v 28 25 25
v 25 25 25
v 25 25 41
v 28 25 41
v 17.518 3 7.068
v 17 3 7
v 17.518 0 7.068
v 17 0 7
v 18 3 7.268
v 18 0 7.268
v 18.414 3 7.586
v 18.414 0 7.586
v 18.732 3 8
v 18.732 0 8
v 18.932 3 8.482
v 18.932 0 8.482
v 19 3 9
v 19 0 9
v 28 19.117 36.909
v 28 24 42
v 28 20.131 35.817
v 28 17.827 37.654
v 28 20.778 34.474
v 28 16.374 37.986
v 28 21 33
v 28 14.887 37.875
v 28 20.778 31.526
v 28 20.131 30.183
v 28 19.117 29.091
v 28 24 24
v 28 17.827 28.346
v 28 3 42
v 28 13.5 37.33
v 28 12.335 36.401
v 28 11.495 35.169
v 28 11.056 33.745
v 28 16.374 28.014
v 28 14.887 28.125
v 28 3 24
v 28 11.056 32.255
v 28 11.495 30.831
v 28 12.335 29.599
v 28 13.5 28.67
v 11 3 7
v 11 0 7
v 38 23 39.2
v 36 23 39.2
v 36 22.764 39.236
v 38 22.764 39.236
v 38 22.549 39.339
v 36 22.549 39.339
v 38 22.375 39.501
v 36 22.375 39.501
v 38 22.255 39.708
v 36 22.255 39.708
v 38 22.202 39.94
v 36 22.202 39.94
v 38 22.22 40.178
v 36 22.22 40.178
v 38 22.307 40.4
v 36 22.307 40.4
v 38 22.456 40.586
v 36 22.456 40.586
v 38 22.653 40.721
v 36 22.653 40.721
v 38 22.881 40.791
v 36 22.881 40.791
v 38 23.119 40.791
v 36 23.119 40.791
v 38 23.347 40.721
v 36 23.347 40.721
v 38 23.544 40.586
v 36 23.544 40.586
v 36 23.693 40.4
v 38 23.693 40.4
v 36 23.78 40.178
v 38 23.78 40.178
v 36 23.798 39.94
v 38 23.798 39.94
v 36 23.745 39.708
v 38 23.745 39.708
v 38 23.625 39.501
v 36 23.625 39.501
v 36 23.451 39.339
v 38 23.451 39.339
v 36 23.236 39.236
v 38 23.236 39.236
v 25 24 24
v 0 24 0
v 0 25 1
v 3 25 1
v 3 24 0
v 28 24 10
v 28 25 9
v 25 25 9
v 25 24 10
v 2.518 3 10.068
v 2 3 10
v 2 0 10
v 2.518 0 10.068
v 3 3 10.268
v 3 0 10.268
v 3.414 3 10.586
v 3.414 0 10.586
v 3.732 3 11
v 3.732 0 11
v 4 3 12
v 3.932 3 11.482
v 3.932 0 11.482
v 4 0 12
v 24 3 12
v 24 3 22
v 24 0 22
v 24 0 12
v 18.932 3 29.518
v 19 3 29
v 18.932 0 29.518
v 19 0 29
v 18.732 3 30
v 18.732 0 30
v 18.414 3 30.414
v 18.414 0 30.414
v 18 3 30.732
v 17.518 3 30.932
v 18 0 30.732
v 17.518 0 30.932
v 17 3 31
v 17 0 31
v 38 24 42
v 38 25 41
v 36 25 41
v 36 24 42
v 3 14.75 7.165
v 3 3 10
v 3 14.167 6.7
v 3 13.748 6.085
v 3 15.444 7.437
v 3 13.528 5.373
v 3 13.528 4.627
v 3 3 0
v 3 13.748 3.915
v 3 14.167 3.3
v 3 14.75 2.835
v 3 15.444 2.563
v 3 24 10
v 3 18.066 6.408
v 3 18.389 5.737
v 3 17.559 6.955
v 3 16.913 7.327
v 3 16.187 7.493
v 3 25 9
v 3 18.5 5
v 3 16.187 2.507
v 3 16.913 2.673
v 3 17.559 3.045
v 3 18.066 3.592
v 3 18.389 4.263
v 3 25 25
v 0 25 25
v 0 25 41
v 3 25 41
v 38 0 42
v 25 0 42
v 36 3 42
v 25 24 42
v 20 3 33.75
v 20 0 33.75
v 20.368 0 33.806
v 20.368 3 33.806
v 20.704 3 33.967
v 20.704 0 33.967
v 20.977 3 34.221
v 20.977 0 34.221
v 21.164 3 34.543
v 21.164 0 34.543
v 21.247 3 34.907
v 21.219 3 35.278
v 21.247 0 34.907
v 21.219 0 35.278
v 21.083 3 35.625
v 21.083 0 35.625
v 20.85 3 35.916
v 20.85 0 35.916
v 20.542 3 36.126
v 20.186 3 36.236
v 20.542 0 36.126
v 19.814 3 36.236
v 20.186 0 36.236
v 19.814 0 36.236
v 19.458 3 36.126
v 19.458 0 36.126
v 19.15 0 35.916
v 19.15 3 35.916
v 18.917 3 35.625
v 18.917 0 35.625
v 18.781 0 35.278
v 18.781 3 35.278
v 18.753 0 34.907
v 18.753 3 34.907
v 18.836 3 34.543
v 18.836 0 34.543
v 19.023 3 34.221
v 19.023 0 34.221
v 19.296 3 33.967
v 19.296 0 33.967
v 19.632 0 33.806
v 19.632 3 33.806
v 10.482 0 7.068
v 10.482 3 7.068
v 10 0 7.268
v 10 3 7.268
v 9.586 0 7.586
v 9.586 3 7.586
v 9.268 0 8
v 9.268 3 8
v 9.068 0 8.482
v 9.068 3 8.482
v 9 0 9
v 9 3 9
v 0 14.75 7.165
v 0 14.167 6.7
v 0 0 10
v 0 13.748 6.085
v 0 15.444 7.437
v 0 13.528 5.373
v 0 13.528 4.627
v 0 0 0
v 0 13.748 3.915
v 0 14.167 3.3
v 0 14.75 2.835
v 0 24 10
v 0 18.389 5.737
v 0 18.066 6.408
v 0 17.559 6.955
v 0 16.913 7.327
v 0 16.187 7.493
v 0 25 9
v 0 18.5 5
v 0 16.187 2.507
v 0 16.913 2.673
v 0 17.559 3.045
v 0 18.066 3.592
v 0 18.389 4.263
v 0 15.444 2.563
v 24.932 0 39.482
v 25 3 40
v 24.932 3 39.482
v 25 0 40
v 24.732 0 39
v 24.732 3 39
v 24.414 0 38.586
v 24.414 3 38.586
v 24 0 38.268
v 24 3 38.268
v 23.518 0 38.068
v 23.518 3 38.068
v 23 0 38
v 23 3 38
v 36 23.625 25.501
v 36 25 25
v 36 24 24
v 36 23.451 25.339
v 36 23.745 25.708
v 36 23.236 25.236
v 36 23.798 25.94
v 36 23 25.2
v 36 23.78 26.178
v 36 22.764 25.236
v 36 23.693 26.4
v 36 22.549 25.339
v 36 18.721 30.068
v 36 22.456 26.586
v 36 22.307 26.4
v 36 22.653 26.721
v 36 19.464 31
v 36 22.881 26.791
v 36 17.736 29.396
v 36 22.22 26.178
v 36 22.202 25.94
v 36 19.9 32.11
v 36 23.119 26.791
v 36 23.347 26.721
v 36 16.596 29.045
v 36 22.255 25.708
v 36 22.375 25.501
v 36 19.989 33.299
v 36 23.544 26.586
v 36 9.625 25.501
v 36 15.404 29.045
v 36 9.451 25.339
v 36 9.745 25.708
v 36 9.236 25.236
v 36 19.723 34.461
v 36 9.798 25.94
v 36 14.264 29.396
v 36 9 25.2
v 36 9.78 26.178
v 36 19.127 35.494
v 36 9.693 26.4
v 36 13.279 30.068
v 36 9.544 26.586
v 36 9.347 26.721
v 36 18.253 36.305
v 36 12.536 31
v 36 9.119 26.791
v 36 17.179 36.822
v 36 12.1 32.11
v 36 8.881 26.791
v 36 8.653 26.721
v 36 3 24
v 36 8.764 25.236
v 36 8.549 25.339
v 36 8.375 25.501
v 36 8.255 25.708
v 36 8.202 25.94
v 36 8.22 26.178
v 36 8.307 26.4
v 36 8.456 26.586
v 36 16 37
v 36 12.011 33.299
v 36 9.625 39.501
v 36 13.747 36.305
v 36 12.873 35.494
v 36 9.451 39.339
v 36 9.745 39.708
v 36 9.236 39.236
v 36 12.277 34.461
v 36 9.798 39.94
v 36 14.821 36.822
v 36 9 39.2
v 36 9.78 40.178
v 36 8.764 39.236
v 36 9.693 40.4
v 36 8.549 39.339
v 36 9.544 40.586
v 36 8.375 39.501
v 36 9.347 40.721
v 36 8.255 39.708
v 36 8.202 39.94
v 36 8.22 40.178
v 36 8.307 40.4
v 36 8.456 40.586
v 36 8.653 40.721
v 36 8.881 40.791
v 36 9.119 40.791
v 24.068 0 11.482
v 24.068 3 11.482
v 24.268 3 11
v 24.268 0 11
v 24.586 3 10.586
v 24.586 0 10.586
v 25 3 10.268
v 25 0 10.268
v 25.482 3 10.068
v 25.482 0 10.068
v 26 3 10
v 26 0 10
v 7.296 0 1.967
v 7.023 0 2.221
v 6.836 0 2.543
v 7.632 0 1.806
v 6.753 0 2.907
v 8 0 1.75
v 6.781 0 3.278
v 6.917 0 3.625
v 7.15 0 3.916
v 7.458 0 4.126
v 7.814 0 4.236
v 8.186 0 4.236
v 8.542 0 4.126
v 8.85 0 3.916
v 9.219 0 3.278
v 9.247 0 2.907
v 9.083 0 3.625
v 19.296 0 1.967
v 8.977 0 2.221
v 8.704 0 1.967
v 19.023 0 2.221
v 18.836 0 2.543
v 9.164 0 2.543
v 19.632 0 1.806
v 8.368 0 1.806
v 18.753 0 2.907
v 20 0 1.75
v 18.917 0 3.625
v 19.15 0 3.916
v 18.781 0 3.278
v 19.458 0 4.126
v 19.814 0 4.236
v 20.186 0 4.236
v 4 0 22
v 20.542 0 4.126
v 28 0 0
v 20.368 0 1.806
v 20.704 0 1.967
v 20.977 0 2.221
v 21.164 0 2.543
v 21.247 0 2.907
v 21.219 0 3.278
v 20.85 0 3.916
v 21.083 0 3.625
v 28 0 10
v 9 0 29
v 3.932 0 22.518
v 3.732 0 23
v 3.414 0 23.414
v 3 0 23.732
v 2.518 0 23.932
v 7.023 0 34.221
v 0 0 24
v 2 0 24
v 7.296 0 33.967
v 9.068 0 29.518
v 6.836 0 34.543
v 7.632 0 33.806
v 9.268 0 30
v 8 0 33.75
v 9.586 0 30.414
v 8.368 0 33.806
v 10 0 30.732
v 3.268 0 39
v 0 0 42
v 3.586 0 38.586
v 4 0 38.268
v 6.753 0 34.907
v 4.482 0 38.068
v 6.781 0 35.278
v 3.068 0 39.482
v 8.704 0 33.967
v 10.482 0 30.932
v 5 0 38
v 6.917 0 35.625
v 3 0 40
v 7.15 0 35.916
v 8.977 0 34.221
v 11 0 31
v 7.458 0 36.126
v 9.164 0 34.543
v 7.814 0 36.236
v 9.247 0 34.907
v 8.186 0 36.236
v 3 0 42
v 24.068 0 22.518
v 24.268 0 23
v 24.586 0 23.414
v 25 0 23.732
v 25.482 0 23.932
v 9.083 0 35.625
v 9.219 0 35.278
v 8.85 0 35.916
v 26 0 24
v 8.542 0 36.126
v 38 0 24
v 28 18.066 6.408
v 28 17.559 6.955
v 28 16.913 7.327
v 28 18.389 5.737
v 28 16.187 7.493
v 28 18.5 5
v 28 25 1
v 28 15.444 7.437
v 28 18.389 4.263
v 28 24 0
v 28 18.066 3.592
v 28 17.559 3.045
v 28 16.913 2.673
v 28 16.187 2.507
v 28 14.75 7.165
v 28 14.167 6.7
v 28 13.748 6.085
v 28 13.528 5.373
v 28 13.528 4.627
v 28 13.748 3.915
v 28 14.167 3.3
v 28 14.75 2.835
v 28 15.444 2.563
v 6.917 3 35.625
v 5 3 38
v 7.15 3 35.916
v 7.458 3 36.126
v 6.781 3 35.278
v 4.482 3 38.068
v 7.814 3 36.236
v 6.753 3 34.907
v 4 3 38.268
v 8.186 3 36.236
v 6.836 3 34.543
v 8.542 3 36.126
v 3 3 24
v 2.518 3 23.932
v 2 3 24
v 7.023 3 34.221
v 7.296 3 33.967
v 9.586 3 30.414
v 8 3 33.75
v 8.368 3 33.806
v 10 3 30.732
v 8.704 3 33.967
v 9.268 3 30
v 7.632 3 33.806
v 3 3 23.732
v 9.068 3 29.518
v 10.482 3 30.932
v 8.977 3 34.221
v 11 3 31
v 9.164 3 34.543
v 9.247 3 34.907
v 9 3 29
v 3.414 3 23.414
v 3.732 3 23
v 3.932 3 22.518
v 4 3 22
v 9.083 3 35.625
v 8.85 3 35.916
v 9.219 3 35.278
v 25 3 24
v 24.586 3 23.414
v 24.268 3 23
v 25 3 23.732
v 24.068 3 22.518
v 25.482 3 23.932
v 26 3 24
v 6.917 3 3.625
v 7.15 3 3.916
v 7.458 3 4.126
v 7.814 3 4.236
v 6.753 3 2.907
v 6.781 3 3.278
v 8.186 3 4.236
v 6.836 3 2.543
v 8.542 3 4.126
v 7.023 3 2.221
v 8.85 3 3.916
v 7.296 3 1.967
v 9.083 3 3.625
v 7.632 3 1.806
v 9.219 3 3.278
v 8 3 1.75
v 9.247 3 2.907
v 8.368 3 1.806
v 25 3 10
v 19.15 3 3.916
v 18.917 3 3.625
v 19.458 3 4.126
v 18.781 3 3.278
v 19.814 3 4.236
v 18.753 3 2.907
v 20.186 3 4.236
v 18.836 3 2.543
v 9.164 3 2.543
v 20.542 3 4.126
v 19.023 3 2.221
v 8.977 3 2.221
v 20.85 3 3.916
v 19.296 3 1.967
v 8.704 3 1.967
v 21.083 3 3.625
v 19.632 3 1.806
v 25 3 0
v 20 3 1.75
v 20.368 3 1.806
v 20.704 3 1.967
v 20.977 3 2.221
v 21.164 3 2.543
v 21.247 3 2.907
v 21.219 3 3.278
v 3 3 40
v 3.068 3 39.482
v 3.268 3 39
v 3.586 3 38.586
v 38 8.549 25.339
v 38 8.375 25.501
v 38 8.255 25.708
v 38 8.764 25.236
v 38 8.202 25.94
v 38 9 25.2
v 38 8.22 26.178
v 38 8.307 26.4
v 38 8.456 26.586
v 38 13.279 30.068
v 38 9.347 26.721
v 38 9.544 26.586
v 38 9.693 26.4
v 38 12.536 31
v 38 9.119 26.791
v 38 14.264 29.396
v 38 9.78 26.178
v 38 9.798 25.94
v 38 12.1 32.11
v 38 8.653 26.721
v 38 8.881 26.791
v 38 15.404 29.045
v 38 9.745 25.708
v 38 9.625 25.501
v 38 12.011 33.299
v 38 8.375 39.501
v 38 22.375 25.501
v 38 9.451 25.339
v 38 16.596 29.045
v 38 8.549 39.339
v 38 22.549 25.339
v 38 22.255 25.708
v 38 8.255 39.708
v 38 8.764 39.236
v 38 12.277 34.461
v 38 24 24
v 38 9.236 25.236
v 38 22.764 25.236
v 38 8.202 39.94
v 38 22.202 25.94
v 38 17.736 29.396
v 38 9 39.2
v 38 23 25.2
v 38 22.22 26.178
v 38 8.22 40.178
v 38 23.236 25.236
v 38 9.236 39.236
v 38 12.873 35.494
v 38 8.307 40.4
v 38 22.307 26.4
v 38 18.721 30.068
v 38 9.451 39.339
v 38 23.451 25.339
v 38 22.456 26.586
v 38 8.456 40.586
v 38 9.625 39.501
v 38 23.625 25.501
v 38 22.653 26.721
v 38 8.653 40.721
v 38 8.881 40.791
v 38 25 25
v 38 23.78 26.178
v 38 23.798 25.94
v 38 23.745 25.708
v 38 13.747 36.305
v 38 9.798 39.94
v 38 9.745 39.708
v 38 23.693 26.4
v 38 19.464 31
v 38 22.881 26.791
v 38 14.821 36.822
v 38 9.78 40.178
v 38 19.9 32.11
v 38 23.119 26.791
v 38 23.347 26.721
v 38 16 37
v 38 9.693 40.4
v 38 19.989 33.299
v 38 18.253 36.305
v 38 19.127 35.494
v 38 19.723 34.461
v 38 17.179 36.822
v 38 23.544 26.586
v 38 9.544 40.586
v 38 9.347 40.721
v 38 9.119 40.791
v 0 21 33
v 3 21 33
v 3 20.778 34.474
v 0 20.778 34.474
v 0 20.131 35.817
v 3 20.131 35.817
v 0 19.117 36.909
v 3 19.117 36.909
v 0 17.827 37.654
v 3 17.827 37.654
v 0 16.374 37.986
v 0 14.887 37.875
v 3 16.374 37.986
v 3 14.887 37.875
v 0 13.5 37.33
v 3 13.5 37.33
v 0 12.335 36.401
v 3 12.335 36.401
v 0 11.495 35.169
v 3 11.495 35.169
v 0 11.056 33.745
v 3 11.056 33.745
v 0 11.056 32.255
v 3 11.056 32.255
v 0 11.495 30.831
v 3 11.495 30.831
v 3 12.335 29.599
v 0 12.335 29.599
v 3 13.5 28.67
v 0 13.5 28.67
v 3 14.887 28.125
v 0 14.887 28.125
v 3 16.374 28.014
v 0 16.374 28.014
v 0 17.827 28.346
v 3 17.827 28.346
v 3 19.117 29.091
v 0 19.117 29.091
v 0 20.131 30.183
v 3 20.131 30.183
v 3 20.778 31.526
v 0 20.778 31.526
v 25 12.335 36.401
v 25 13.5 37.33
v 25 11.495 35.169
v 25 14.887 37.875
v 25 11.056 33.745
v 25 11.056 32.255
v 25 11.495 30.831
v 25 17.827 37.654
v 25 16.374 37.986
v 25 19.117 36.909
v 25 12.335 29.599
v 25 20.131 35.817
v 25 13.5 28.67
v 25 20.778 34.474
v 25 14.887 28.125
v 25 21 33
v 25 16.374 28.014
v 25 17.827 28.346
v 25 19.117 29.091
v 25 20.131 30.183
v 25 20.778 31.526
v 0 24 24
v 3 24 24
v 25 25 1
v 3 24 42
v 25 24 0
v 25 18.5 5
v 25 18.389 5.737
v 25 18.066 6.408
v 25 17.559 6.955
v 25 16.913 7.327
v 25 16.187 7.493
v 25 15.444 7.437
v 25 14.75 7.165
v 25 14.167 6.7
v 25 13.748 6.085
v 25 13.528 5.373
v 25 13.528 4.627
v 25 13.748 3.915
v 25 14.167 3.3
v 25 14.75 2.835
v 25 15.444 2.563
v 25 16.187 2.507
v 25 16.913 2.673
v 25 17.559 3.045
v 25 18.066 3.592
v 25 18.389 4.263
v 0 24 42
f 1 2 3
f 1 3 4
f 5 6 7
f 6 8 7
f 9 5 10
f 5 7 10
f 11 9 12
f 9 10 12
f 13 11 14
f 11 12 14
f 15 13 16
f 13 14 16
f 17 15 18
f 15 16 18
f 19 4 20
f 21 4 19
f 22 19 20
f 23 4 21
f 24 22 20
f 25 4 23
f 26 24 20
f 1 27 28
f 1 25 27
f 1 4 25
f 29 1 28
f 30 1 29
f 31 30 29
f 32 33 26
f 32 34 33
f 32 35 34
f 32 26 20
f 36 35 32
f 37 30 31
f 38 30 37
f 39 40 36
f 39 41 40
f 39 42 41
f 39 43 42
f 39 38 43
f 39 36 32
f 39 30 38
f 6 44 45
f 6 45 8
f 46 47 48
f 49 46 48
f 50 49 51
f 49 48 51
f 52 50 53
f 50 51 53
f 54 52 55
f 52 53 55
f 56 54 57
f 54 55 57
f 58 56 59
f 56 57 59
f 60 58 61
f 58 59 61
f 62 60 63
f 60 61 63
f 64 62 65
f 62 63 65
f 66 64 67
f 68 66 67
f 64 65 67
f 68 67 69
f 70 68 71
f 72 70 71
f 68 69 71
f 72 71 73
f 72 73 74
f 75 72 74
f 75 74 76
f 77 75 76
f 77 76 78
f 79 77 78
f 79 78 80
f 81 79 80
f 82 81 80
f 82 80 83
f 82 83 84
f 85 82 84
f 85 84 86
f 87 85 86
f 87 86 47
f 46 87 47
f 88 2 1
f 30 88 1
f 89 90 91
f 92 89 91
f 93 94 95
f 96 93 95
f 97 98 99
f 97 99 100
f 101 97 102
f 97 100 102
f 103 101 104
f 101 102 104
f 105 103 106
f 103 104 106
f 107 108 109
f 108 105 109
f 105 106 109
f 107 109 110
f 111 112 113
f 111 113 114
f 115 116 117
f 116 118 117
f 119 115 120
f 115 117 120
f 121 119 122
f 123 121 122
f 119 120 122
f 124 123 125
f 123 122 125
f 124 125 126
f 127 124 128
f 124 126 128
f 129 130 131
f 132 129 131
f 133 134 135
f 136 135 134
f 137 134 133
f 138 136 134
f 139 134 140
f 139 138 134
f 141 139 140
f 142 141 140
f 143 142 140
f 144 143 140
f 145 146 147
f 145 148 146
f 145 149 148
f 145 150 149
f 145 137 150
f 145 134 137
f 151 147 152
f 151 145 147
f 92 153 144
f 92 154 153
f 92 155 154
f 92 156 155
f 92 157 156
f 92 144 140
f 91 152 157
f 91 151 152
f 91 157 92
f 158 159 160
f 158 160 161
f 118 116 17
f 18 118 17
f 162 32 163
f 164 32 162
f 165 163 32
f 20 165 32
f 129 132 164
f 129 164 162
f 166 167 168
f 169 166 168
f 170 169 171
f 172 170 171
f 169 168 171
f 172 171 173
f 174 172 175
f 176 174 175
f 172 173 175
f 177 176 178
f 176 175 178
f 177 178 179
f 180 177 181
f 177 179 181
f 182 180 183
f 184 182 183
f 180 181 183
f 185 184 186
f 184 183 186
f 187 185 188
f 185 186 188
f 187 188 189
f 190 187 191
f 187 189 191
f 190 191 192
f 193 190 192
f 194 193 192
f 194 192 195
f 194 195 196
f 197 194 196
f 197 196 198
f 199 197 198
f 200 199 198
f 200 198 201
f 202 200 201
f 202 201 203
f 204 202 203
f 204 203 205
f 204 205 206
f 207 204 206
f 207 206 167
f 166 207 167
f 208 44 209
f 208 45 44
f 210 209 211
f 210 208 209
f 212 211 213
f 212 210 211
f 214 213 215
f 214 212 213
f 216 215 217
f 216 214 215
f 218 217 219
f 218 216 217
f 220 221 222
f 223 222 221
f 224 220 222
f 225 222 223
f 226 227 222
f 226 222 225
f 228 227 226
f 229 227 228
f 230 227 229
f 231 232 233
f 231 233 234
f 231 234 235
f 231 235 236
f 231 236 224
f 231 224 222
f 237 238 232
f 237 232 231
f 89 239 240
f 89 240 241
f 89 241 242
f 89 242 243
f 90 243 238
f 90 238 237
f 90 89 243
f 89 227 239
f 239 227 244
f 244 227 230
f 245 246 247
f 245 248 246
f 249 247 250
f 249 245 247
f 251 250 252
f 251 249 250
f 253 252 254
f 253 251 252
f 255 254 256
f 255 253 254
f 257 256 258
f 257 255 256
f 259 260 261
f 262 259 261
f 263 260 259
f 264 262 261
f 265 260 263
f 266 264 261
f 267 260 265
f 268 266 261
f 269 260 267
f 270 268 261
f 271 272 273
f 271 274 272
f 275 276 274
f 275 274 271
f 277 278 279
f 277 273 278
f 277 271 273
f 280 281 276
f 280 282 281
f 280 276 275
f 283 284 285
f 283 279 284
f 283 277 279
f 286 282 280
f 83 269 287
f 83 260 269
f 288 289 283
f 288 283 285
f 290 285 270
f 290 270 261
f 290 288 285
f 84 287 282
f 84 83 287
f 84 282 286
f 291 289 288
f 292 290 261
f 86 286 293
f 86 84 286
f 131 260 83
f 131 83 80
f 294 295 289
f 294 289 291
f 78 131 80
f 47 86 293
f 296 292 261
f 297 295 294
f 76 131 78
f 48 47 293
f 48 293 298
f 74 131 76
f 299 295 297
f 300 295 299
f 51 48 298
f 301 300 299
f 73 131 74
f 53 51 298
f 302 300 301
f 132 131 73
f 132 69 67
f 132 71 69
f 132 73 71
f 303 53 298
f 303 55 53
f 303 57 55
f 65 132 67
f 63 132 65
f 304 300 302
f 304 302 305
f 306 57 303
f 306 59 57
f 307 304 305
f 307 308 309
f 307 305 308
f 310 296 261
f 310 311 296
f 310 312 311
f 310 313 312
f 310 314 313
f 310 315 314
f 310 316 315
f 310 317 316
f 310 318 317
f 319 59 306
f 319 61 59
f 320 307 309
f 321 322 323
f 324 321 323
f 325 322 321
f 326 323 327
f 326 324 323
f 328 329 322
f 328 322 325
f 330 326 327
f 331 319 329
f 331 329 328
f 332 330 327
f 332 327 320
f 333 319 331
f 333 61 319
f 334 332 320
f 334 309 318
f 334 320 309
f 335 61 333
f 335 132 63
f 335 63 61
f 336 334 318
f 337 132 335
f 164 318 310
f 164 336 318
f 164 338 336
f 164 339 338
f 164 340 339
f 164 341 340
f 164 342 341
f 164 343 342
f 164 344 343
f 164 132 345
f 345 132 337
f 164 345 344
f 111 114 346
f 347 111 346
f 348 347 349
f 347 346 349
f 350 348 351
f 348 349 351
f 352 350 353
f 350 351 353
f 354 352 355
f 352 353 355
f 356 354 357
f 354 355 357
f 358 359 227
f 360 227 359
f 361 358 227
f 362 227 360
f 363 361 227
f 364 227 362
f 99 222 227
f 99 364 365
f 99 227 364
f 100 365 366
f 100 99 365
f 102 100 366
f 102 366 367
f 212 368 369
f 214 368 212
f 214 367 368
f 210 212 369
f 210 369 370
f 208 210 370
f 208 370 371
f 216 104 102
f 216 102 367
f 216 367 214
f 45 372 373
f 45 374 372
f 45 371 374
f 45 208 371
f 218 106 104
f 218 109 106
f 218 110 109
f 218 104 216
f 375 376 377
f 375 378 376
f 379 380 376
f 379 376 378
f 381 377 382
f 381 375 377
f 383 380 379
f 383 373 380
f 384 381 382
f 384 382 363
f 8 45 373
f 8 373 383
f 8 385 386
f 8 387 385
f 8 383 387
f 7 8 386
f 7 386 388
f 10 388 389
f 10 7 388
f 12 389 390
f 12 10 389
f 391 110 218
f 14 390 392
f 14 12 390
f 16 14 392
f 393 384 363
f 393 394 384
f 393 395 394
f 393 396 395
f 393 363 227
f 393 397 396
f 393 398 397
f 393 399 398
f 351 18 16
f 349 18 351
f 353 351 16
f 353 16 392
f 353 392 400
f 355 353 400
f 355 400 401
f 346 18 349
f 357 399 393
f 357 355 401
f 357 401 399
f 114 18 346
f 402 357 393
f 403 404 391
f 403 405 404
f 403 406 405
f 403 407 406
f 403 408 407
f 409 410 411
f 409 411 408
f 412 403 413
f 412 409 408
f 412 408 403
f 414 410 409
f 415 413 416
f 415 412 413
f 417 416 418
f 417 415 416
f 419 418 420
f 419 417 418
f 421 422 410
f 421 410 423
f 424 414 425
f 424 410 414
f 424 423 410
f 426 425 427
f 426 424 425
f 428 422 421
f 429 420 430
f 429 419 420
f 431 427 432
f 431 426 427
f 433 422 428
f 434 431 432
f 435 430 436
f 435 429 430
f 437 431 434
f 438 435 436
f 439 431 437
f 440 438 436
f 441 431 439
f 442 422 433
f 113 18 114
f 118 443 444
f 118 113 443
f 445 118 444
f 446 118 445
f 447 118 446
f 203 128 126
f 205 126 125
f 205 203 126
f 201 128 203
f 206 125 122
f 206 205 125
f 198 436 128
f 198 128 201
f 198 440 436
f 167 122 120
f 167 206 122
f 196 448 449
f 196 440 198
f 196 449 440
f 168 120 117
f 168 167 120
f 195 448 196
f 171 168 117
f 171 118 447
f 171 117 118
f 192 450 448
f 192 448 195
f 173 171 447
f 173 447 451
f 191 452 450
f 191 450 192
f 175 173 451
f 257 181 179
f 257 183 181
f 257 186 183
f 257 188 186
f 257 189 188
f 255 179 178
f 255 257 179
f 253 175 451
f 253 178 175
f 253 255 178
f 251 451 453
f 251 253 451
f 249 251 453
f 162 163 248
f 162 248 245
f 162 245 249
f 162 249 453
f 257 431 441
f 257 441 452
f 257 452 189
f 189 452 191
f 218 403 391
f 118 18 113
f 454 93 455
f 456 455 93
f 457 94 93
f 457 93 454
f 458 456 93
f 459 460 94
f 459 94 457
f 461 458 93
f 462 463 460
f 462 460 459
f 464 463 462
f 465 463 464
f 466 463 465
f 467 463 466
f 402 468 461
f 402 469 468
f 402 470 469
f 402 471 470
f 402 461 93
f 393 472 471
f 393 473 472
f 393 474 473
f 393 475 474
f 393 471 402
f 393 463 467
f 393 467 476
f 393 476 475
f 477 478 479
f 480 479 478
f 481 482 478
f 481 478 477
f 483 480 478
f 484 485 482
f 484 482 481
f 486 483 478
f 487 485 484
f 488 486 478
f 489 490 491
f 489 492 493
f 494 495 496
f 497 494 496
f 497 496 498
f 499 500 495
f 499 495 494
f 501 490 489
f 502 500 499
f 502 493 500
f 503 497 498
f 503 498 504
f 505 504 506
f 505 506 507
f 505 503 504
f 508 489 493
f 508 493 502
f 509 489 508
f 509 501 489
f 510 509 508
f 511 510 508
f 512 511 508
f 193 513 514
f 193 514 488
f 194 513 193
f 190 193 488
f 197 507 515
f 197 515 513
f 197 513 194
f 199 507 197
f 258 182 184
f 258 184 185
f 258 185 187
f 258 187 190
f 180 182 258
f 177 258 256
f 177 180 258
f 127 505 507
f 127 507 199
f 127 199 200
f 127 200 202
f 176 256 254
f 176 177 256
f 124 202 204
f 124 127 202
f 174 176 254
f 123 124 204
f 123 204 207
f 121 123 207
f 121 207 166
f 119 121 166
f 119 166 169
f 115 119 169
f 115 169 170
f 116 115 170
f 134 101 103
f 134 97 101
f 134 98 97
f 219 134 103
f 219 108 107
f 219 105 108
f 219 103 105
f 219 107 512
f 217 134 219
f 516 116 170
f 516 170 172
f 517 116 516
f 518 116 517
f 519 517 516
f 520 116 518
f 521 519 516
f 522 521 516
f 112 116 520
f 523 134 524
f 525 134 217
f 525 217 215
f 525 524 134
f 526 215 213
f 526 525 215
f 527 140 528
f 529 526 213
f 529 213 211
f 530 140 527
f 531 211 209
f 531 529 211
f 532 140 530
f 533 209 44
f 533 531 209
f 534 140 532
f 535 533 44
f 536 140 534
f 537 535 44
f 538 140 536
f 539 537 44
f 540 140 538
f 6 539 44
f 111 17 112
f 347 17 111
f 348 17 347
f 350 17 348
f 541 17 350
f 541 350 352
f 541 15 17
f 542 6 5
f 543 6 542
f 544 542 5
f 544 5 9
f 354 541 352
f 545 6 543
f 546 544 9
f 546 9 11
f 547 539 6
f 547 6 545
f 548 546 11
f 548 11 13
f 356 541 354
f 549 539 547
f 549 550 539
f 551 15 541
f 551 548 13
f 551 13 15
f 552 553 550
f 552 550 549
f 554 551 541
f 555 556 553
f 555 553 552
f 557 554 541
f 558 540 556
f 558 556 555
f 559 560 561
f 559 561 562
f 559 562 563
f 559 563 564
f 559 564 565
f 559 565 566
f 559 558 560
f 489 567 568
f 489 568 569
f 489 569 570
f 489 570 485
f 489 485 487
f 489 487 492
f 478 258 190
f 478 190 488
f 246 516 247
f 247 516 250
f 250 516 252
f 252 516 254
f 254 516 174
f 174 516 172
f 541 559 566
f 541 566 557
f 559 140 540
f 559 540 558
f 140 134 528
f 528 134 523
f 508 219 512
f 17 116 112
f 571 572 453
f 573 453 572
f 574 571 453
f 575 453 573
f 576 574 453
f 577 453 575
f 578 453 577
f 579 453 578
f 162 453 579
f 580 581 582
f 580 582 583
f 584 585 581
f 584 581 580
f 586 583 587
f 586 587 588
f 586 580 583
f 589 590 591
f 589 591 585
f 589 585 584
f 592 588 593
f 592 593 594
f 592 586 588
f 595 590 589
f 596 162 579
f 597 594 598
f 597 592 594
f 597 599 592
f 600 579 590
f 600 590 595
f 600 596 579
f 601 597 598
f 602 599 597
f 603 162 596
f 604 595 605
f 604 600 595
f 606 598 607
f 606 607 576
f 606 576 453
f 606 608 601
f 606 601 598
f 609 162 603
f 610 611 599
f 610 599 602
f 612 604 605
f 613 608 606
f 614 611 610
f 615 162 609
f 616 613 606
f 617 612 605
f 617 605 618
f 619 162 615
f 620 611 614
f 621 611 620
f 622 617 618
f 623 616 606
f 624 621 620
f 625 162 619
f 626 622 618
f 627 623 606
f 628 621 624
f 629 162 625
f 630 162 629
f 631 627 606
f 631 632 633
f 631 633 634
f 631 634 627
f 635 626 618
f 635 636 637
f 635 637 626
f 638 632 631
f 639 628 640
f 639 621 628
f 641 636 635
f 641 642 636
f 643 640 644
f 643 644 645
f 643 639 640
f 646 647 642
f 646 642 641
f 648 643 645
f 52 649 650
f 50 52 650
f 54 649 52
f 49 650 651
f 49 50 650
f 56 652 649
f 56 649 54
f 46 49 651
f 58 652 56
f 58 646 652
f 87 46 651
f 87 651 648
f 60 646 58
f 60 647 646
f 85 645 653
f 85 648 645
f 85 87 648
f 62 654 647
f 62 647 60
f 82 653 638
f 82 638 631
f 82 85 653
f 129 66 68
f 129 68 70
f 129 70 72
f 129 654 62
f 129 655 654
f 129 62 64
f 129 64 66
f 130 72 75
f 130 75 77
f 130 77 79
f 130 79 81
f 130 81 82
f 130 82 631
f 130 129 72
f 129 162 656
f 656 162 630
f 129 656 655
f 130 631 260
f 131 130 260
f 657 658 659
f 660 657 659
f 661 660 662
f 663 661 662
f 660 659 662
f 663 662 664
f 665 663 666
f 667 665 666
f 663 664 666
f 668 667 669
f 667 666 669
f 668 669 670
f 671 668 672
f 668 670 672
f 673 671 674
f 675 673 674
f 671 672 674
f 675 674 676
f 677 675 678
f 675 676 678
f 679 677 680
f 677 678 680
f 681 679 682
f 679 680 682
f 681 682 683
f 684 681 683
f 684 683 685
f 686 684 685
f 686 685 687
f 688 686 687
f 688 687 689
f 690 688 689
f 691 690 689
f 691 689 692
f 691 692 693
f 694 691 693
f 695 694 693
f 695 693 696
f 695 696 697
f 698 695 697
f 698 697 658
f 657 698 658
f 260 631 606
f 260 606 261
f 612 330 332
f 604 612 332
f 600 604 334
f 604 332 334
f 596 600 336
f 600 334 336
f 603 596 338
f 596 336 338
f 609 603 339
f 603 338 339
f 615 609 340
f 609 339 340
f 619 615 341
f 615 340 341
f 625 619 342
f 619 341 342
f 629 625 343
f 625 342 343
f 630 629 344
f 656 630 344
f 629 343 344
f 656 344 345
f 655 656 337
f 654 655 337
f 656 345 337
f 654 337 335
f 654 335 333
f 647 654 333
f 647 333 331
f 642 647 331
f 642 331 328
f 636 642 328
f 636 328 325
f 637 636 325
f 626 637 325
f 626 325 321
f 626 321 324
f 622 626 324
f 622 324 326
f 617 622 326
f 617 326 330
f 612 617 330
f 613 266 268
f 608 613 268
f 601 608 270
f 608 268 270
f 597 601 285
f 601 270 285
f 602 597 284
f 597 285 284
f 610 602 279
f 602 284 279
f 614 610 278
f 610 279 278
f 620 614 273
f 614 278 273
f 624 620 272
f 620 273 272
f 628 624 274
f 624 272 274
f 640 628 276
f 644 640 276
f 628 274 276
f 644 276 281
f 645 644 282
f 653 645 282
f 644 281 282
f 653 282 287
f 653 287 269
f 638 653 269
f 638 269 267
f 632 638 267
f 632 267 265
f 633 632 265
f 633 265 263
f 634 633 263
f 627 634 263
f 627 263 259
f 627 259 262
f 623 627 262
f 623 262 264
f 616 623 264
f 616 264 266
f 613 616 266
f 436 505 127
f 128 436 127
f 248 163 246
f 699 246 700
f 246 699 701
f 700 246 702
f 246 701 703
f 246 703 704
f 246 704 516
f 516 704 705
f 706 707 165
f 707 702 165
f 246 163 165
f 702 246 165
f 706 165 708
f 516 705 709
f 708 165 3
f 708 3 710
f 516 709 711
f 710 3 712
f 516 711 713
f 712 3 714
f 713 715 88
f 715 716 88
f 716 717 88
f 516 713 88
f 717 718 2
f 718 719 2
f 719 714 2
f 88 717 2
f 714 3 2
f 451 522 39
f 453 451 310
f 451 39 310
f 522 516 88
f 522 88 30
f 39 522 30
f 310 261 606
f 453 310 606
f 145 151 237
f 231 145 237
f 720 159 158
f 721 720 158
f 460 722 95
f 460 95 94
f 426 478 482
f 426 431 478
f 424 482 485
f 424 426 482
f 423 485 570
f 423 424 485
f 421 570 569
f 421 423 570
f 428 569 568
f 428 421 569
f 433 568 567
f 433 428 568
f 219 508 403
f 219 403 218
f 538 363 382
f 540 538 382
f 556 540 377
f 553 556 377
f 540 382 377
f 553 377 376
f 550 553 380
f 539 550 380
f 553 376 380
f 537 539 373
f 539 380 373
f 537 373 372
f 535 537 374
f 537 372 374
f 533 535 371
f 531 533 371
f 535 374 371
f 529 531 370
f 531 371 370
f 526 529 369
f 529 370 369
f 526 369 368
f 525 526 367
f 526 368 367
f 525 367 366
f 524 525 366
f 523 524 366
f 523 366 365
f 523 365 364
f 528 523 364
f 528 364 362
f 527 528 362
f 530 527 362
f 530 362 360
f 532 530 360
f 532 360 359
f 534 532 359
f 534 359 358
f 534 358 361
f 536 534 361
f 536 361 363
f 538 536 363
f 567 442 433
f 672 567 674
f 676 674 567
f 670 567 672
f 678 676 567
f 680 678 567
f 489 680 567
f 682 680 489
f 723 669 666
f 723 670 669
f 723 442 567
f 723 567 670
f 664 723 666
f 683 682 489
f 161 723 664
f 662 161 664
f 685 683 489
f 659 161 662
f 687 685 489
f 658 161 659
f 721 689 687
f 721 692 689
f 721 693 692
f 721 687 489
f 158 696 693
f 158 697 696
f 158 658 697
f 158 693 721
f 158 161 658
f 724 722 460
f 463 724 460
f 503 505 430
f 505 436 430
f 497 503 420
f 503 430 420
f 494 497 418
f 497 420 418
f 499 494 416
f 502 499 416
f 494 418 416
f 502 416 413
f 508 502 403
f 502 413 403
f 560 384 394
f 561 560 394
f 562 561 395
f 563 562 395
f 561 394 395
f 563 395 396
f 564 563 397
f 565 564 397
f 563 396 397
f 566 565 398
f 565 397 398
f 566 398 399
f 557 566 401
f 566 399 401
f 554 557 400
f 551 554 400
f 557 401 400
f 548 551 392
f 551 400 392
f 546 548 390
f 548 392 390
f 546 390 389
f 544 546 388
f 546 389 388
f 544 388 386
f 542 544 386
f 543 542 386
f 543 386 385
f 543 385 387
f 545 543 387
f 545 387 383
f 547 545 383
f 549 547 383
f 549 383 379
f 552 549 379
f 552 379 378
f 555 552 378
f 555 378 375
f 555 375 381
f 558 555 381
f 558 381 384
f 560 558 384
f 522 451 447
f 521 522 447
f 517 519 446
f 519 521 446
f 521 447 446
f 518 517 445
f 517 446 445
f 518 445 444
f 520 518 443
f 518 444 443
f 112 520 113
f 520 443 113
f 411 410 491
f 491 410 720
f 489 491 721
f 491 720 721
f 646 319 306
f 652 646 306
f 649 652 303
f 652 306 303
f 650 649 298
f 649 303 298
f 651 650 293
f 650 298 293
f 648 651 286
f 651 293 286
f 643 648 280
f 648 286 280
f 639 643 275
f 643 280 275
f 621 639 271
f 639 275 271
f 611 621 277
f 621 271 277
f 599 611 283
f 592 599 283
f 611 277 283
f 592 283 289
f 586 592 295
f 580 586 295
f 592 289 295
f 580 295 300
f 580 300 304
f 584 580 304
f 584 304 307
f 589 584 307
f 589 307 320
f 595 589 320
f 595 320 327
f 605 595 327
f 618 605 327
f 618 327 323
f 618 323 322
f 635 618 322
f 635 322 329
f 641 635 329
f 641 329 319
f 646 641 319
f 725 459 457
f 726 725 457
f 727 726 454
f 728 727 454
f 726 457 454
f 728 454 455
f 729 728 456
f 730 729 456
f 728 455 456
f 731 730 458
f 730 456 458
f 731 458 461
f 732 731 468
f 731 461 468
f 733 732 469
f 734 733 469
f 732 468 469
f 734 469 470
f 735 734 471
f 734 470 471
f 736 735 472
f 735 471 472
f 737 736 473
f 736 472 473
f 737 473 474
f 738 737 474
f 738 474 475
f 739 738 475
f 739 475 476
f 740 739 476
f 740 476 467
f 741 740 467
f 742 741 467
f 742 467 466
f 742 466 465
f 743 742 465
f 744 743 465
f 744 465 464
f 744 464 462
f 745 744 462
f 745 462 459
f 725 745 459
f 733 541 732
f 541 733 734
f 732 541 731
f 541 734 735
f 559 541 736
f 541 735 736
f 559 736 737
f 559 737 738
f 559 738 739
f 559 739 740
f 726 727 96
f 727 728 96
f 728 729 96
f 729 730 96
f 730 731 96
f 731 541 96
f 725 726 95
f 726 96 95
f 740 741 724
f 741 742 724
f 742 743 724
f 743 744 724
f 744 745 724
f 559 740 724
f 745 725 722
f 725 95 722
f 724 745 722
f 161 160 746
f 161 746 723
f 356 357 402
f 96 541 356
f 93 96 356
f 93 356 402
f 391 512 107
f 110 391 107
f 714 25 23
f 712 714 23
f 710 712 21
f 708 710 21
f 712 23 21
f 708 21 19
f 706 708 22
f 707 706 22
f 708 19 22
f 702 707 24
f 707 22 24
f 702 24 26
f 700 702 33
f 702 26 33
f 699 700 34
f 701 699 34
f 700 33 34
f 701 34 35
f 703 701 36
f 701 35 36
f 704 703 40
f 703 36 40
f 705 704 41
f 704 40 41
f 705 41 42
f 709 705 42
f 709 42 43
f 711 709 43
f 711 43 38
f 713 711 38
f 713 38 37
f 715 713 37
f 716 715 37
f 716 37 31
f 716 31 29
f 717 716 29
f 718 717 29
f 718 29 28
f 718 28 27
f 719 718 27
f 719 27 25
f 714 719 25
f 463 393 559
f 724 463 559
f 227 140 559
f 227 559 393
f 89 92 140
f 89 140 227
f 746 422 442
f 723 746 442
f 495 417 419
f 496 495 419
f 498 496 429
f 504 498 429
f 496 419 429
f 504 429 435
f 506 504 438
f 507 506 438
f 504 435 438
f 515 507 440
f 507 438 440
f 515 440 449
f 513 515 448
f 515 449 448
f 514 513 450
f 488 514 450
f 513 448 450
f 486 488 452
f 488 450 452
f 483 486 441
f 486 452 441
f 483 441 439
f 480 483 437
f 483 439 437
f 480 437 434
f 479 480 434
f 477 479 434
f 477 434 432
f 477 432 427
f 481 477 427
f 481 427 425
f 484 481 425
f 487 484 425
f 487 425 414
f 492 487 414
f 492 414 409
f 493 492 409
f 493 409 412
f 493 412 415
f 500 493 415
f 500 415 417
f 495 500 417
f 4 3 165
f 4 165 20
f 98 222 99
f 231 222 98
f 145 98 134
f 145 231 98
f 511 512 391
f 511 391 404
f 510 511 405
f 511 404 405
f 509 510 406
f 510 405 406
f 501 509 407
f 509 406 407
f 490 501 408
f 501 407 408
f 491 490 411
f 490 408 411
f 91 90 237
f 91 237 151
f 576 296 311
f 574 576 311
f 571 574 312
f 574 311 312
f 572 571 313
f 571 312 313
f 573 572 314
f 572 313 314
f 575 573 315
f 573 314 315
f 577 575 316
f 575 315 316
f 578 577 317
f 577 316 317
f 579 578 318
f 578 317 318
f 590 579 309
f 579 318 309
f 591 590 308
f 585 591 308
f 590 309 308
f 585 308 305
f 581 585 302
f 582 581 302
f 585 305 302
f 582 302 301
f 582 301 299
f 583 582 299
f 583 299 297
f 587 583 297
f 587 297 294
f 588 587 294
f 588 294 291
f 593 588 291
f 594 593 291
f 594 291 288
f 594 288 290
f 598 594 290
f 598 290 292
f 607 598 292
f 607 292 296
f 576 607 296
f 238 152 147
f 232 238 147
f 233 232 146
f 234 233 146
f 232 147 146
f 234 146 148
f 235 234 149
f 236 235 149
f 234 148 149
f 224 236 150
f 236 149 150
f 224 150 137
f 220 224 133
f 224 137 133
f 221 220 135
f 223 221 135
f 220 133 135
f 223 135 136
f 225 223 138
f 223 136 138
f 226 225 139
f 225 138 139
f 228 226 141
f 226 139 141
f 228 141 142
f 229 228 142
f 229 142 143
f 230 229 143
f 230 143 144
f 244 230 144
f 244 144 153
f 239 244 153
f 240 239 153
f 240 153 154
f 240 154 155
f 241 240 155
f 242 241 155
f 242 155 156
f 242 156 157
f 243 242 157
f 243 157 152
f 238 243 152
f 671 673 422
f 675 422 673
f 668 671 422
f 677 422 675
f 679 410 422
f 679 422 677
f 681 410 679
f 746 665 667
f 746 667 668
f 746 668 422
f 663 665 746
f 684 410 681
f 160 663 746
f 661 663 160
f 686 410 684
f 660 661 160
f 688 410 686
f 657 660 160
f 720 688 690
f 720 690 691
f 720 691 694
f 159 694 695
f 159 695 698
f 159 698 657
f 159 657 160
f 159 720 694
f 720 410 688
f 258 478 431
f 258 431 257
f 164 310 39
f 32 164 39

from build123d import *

# Parameters (mm, degrees)
EXTRUDE_1_DEPTH        = 42
SKETCH_2_R             = 2.5
SKETCH_2_R_2           = 5
CUT_EXTRUDE_1_DEPTH    = 57.329388422
EXTRUDE_2_DEPTH        = 18
SKETCH_5_R             = 4
CUT_EXTRUDE_2_DEPTH    = 61.704200843
HOLE_WIZARD_M3_1_D     = 2.5
HOLE_WIZARD_M3_1_DEPTH = 7.5
HOLE_WIZARD_M3_1_TIP   = 0.751075774
SKETCH_9_W             = 22
SKETCH_9_H             = 4
CUT_EXTRUDE_4_DEPTH    = 61.761830124
FILLET_1_R             = 2
SKETCH_10_W            = 10
SKETCH_10_H            = 24
CUT_EXTRUDE_5_DEPTH    = 61.761830124
FILLET_2_R             = 2
SKETCH_11_W            = 4
SKETCH_11_H            = 14
CUT_EXTRUDE_8_DEPTH    = 62.911226769
FILLET_3_R             = 2
SKETCH_12_W            = 28
SKETCH_12_H            = 14
CUT_EXTRUDE_9_DEPTH    = 22
HOLE_WIZARD_M2_1_D     = 1.6
HOLE_WIZARD_M2_1_DEPTH = 4
HOLE_WIZARD_M2_1_TIP   = 0.480688495
CHAMFER_1_SIZE         = 1


with BuildPart() as part:
    # 草图1 → 凸台-拉伸1 (new body)
    with BuildSketch(Plane.XY):
        Polygon((0, 0), (0, 25), (3, 25), (3, 3), (25, 3), (25, 25), (28, 25), (28, 0), align=None)
    extrude(amount=EXTRUDE_1_DEPTH)

    # 草图2 → 切除-拉伸1 (cut, through all)
    with BuildSketch(Plane(origin=(28, 0, 0), x_dir=(0, 0, -1), z_dir=(1, 0, 0))):
        with Locations(Location((-5, 16, 0), (0, 0, 90))):
            Circle(SKETCH_2_R)
        with Locations(Location((-33, 16, 0), (0, 0, 90))):
            Circle(SKETCH_2_R_2)
    extrude(amount=-CUT_EXTRUDE_1_DEPTH, mode=Mode.SUBTRACT)

    # 草图3 → 凸台-拉伸2 (add)
    with BuildSketch(Plane.XY.offset(42)):
        Polygon((28, 0), (38, 0), (38, 25), (36, 25), (36, 3), (28, 3), align=None)
    extrude(amount=-EXTRUDE_2_DEPTH)

    # 草图5 → 切除-拉伸2 (cut, through all)
    with BuildSketch(Plane.ZY.offset(-36)):
        with Locations((33, 16)):
            Circle(SKETCH_5_R)
    extrude(amount=-CUT_EXTRUDE_2_DEPTH, mode=Mode.SUBTRACT)

    # M3 螺纹孔1
    with Locations(Plane(origin=(20, 3, 3), x_dir=(0, 0, 1), z_dir=(0, 1, 0))):
        with Locations((0, 0), (0, -12), (32, 0), (32, -12)):
            Hole(HOLE_WIZARD_M3_1_D / 2, depth=HOLE_WIZARD_M3_1_DEPTH)
            with Locations((0, 0, -(HOLE_WIZARD_M3_1_DEPTH + HOLE_WIZARD_M3_1_TIP / 2))):  # 118° drill point
                Cone(0, HOLE_WIZARD_M3_1_D / 2, HOLE_WIZARD_M3_1_TIP, mode=Mode.SUBTRACT)

    # 草图9 → 切除-拉伸4 (cut, through all)
    with BuildSketch(Plane(origin=(0, 3, 0), x_dir=(1, 0, 0), z_dir=(0, 1, 0))):
        with Locations((14, -40)):
            Rectangle(SKETCH_9_W, SKETCH_9_H)
    extrude(amount=-CUT_EXTRUDE_4_DEPTH, mode=Mode.SUBTRACT)

    # 圆角1
    fillet_1_edges = [part.edges().sort_by_distance(p)[0] for p in [
        (3, 1.5, 38),
        (25, 1.5, 38),
    ]]
    fillet(fillet_1_edges, radius=FILLET_1_R)

    # 草图10 → 切除-拉伸5 (cut, through all)
    with BuildSketch(Plane(origin=(0, 3, 0), x_dir=(1, 0, 0), z_dir=(0, 1, 0))):
        with Locations((14, -19)):
            Rectangle(SKETCH_10_W, SKETCH_10_H)
    extrude(amount=-CUT_EXTRUDE_5_DEPTH, mode=Mode.SUBTRACT)

    # 圆角2
    fillet_2_edges = [part.edges().sort_by_distance(p)[0] for p in [
        (19, 1.5, 7),
        (19, 1.5, 31),
        (9, 1.5, 31),
        (9, 1.5, 7),
    ]]
    fillet(fillet_2_edges, radius=FILLET_2_R)

    # 草图11 → 切除-拉伸8 (cut, through all)
    with BuildSketch(Plane(origin=(0, 25, 0), x_dir=(1, 0, 0), z_dir=(0, 1, 0))):
        with Locations((26, -17)):
            Rectangle(SKETCH_11_W, SKETCH_11_H)
        with Locations((2, -17)):
            Rectangle(SKETCH_11_W, SKETCH_11_H)
    extrude(amount=-CUT_EXTRUDE_8_DEPTH, mode=Mode.SUBTRACT)

    # 圆角3
    fillet_3_edges = [part.edges().sort_by_distance(p)[0] for p in [
        (4, 1.5, 10),
        (4, 1.5, 24),
        (24, 1.5, 24),
        (24, 1.5, 10),
    ]]
    fillet(fillet_3_edges, radius=FILLET_3_R)

    # 草图12 → 切除-拉伸9 (cut)
    with BuildSketch(Plane(origin=(0, 25, 0), x_dir=(1, 0, 0), z_dir=(0, 1, 0))):
        with Locations((14, -17)):
            Rectangle(SKETCH_12_W, SKETCH_12_H)
    extrude(amount=-CUT_EXTRUDE_9_DEPTH, mode=Mode.SUBTRACT)

    # M2 螺纹孔1
    with Locations(Plane(origin=(38, 23, 40), x_dir=(0, 0, 1), z_dir=(1, 0, 0))):
        with Locations((0, 0), (-14, 0), (-14, 14), (0, 14)):
            Hole(HOLE_WIZARD_M2_1_D / 2, depth=HOLE_WIZARD_M2_1_DEPTH)
            with Locations((0, 0, -(HOLE_WIZARD_M2_1_DEPTH + HOLE_WIZARD_M2_1_TIP / 2))):  # 118° drill point
                Cone(0, HOLE_WIZARD_M2_1_D / 2, HOLE_WIZARD_M2_1_TIP, mode=Mode.SUBTRACT)

    # 倒角1
    chamfer_1_edges = [part.edges().sort_by_distance(p)[0] for p in [
        (26.5, 25, 42),
        (26.5, 25, 10),
        (1.5, 25, 24),
        (1.5, 25, 10),
        (26.5, 25, 24),
        (1.5, 25, 42),
        (37, 25, 24),
        (37, 25, 42),
        (1.5, 25, 0),
        (26.5, 25, 0),
    ]]
    chamfer(chamfer_1_edges, length=CHAMFER_1_SIZE)


solid = part.part
